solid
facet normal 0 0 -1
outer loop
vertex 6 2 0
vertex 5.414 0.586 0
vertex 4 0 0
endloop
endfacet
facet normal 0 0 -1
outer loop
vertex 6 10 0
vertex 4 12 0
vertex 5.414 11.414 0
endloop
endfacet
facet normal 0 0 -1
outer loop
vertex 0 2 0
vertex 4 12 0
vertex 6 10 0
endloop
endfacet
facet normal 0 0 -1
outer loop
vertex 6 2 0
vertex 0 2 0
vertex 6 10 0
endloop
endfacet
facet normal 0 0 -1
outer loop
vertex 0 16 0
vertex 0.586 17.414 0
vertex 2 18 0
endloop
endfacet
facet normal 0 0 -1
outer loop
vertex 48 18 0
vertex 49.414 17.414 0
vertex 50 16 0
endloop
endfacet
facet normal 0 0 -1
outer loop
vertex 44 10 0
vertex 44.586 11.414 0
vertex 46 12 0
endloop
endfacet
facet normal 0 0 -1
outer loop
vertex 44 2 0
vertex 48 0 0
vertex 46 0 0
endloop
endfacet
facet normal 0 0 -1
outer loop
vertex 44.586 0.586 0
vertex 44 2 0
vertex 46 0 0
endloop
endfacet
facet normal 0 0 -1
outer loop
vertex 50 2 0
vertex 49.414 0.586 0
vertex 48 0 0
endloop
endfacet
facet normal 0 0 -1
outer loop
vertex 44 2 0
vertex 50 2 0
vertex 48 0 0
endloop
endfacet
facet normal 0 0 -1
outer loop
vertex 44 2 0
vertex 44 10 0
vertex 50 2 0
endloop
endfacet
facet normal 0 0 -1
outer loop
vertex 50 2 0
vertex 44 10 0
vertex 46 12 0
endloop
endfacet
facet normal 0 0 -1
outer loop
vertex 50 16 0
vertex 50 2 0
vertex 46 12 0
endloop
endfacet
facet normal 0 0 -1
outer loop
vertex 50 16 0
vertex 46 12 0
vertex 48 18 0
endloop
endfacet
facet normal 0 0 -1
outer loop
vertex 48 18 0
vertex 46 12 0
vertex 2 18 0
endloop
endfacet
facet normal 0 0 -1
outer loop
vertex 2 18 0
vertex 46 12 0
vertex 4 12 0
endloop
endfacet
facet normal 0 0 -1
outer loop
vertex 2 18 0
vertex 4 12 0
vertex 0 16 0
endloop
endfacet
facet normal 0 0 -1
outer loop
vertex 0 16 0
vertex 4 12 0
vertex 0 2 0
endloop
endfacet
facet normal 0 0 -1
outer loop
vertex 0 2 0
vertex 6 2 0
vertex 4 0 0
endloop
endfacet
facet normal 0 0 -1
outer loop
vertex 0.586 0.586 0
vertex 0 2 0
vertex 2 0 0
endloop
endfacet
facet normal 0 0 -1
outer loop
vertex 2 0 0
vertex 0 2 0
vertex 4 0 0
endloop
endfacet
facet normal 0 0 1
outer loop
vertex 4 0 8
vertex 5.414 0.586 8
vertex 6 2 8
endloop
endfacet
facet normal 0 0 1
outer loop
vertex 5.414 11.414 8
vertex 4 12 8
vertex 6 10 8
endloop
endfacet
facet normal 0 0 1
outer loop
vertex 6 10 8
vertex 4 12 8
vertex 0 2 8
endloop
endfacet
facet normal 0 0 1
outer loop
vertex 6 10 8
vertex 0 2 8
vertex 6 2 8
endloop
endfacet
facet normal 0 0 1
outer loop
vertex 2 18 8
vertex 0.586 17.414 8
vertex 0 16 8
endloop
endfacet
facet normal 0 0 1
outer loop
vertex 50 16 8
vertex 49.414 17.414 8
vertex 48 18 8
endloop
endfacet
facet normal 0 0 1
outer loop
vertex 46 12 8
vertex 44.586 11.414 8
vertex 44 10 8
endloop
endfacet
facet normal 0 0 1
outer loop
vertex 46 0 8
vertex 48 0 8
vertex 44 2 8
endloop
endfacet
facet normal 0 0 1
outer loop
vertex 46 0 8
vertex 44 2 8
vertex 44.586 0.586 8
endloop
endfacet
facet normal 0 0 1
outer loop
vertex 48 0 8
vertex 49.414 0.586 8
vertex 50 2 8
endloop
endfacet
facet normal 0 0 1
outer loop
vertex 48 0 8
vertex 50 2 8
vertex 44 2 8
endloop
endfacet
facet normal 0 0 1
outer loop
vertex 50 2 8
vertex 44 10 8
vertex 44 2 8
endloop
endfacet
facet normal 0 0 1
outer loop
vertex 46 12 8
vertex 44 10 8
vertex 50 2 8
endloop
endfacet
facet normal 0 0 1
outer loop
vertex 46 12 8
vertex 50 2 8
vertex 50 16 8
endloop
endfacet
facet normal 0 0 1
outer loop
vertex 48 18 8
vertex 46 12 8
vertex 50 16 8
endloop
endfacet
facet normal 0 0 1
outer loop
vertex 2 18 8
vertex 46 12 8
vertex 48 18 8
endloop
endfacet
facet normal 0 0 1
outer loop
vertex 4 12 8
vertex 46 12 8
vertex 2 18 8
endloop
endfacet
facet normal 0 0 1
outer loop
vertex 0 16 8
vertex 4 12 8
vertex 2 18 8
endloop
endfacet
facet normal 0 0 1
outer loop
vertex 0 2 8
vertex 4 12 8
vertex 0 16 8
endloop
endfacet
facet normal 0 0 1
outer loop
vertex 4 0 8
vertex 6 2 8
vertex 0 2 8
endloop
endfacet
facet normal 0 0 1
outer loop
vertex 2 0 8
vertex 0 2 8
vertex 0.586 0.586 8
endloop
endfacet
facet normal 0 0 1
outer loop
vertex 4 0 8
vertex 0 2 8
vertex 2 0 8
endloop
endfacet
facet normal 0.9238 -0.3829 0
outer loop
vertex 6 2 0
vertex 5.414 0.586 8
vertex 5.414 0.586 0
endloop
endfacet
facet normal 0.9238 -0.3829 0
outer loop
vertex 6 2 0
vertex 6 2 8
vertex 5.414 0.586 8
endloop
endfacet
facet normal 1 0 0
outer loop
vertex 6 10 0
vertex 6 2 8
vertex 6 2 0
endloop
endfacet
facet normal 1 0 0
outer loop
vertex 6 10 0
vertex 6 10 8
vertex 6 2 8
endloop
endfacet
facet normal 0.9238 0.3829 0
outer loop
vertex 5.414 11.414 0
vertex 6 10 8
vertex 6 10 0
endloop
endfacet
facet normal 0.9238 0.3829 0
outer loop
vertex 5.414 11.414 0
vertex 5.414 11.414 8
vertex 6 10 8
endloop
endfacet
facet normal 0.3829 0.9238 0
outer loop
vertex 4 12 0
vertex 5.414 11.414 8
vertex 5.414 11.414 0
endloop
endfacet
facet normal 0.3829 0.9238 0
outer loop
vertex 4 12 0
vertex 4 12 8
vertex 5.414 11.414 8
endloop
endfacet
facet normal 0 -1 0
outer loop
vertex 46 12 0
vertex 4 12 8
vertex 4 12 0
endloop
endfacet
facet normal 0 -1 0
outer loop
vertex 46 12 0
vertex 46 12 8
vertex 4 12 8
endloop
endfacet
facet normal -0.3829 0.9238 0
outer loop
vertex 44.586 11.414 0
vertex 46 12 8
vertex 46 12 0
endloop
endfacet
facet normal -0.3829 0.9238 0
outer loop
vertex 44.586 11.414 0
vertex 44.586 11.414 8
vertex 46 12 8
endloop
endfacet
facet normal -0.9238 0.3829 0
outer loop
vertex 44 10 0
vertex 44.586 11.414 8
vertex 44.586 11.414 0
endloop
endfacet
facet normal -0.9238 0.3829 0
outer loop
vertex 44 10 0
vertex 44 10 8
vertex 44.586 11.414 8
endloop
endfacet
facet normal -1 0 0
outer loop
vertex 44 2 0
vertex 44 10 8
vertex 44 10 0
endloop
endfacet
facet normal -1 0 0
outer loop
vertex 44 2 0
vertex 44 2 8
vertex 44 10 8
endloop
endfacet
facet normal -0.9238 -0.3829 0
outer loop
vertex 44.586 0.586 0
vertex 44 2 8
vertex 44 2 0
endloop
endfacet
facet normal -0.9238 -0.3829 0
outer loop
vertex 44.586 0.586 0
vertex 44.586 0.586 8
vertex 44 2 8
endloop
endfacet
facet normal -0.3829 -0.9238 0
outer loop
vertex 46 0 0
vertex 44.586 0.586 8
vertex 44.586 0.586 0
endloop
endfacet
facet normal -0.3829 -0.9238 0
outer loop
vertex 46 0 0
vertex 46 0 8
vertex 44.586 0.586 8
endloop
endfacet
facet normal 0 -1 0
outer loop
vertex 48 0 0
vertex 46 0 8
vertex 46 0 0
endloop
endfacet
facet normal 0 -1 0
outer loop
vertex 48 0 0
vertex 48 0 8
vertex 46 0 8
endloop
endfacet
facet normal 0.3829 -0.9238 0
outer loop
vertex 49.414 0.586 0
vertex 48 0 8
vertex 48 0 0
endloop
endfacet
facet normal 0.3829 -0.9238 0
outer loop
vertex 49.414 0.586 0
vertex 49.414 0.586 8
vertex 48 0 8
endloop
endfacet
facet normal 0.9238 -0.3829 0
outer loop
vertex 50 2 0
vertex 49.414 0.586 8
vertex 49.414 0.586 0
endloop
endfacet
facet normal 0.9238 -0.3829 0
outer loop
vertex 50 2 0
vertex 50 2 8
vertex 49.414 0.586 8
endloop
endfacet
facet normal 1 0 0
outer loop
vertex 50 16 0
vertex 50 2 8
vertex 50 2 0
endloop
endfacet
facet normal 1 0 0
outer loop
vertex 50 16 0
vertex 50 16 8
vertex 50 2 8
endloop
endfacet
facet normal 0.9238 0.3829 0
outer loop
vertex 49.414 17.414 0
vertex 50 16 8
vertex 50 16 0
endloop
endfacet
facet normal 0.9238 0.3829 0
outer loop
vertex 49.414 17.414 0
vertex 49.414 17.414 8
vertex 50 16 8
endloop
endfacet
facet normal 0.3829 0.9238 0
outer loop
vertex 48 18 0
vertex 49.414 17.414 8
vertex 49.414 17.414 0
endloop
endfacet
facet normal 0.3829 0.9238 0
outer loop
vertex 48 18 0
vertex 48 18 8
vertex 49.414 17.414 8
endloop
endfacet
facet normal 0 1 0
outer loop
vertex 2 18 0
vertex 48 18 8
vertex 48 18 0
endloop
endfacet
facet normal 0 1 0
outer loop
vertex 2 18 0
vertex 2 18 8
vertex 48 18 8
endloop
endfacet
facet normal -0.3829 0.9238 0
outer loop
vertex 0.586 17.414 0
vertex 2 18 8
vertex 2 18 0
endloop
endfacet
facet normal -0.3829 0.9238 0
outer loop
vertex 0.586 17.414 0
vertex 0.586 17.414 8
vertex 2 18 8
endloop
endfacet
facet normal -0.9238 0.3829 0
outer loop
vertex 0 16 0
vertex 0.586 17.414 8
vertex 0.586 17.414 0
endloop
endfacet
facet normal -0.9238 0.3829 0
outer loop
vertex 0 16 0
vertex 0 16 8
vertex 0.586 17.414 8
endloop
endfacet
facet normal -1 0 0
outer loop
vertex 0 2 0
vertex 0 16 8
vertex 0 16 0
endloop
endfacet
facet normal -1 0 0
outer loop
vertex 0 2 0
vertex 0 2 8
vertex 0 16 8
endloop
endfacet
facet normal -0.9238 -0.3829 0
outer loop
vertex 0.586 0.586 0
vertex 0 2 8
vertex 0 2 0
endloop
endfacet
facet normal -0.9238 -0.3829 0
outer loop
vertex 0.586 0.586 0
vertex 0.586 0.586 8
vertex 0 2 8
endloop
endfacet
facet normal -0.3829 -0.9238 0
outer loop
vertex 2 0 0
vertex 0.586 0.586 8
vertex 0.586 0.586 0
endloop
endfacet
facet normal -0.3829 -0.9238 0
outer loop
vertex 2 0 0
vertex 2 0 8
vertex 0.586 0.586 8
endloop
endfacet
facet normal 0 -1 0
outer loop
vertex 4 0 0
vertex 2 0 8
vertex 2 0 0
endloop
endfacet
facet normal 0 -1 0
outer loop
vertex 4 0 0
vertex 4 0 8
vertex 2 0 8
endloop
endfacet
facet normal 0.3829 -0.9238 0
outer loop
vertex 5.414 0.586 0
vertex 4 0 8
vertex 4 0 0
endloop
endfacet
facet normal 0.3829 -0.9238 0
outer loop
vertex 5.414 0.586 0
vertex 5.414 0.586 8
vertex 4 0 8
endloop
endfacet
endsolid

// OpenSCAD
$fn = 32;

// ----------------------------------------------------------------------
// Clip blank: staple clip, 8 mm thick
// ----------------------------------------------------------------------

// --- parameters (mm) ---
profile_height = 8;       // extrusion height
profile_points = 24;      // points of the closed outline

profile = [[0, 2], [0.586, 0.586], [2, 0], [4, 0], [5.414, 0.586], [6, 2], [6, 10], [5.414, 11.414], [4, 12], [46, 12], [44.586, 11.414], [44, 10], [44, 2], [44.586, 0.586], [46, 0], [48, 0], [49.414, 0.586], [50, 2], [50, 16], [49.414, 17.414], [48, 18], [2, 18], [0.586, 17.414], [0, 16]];  // single closed polygon, 24 points, counter clockwise

// --- the one profile operation ---
linear_extrude(height = profile_height) polygon(points = profile);
